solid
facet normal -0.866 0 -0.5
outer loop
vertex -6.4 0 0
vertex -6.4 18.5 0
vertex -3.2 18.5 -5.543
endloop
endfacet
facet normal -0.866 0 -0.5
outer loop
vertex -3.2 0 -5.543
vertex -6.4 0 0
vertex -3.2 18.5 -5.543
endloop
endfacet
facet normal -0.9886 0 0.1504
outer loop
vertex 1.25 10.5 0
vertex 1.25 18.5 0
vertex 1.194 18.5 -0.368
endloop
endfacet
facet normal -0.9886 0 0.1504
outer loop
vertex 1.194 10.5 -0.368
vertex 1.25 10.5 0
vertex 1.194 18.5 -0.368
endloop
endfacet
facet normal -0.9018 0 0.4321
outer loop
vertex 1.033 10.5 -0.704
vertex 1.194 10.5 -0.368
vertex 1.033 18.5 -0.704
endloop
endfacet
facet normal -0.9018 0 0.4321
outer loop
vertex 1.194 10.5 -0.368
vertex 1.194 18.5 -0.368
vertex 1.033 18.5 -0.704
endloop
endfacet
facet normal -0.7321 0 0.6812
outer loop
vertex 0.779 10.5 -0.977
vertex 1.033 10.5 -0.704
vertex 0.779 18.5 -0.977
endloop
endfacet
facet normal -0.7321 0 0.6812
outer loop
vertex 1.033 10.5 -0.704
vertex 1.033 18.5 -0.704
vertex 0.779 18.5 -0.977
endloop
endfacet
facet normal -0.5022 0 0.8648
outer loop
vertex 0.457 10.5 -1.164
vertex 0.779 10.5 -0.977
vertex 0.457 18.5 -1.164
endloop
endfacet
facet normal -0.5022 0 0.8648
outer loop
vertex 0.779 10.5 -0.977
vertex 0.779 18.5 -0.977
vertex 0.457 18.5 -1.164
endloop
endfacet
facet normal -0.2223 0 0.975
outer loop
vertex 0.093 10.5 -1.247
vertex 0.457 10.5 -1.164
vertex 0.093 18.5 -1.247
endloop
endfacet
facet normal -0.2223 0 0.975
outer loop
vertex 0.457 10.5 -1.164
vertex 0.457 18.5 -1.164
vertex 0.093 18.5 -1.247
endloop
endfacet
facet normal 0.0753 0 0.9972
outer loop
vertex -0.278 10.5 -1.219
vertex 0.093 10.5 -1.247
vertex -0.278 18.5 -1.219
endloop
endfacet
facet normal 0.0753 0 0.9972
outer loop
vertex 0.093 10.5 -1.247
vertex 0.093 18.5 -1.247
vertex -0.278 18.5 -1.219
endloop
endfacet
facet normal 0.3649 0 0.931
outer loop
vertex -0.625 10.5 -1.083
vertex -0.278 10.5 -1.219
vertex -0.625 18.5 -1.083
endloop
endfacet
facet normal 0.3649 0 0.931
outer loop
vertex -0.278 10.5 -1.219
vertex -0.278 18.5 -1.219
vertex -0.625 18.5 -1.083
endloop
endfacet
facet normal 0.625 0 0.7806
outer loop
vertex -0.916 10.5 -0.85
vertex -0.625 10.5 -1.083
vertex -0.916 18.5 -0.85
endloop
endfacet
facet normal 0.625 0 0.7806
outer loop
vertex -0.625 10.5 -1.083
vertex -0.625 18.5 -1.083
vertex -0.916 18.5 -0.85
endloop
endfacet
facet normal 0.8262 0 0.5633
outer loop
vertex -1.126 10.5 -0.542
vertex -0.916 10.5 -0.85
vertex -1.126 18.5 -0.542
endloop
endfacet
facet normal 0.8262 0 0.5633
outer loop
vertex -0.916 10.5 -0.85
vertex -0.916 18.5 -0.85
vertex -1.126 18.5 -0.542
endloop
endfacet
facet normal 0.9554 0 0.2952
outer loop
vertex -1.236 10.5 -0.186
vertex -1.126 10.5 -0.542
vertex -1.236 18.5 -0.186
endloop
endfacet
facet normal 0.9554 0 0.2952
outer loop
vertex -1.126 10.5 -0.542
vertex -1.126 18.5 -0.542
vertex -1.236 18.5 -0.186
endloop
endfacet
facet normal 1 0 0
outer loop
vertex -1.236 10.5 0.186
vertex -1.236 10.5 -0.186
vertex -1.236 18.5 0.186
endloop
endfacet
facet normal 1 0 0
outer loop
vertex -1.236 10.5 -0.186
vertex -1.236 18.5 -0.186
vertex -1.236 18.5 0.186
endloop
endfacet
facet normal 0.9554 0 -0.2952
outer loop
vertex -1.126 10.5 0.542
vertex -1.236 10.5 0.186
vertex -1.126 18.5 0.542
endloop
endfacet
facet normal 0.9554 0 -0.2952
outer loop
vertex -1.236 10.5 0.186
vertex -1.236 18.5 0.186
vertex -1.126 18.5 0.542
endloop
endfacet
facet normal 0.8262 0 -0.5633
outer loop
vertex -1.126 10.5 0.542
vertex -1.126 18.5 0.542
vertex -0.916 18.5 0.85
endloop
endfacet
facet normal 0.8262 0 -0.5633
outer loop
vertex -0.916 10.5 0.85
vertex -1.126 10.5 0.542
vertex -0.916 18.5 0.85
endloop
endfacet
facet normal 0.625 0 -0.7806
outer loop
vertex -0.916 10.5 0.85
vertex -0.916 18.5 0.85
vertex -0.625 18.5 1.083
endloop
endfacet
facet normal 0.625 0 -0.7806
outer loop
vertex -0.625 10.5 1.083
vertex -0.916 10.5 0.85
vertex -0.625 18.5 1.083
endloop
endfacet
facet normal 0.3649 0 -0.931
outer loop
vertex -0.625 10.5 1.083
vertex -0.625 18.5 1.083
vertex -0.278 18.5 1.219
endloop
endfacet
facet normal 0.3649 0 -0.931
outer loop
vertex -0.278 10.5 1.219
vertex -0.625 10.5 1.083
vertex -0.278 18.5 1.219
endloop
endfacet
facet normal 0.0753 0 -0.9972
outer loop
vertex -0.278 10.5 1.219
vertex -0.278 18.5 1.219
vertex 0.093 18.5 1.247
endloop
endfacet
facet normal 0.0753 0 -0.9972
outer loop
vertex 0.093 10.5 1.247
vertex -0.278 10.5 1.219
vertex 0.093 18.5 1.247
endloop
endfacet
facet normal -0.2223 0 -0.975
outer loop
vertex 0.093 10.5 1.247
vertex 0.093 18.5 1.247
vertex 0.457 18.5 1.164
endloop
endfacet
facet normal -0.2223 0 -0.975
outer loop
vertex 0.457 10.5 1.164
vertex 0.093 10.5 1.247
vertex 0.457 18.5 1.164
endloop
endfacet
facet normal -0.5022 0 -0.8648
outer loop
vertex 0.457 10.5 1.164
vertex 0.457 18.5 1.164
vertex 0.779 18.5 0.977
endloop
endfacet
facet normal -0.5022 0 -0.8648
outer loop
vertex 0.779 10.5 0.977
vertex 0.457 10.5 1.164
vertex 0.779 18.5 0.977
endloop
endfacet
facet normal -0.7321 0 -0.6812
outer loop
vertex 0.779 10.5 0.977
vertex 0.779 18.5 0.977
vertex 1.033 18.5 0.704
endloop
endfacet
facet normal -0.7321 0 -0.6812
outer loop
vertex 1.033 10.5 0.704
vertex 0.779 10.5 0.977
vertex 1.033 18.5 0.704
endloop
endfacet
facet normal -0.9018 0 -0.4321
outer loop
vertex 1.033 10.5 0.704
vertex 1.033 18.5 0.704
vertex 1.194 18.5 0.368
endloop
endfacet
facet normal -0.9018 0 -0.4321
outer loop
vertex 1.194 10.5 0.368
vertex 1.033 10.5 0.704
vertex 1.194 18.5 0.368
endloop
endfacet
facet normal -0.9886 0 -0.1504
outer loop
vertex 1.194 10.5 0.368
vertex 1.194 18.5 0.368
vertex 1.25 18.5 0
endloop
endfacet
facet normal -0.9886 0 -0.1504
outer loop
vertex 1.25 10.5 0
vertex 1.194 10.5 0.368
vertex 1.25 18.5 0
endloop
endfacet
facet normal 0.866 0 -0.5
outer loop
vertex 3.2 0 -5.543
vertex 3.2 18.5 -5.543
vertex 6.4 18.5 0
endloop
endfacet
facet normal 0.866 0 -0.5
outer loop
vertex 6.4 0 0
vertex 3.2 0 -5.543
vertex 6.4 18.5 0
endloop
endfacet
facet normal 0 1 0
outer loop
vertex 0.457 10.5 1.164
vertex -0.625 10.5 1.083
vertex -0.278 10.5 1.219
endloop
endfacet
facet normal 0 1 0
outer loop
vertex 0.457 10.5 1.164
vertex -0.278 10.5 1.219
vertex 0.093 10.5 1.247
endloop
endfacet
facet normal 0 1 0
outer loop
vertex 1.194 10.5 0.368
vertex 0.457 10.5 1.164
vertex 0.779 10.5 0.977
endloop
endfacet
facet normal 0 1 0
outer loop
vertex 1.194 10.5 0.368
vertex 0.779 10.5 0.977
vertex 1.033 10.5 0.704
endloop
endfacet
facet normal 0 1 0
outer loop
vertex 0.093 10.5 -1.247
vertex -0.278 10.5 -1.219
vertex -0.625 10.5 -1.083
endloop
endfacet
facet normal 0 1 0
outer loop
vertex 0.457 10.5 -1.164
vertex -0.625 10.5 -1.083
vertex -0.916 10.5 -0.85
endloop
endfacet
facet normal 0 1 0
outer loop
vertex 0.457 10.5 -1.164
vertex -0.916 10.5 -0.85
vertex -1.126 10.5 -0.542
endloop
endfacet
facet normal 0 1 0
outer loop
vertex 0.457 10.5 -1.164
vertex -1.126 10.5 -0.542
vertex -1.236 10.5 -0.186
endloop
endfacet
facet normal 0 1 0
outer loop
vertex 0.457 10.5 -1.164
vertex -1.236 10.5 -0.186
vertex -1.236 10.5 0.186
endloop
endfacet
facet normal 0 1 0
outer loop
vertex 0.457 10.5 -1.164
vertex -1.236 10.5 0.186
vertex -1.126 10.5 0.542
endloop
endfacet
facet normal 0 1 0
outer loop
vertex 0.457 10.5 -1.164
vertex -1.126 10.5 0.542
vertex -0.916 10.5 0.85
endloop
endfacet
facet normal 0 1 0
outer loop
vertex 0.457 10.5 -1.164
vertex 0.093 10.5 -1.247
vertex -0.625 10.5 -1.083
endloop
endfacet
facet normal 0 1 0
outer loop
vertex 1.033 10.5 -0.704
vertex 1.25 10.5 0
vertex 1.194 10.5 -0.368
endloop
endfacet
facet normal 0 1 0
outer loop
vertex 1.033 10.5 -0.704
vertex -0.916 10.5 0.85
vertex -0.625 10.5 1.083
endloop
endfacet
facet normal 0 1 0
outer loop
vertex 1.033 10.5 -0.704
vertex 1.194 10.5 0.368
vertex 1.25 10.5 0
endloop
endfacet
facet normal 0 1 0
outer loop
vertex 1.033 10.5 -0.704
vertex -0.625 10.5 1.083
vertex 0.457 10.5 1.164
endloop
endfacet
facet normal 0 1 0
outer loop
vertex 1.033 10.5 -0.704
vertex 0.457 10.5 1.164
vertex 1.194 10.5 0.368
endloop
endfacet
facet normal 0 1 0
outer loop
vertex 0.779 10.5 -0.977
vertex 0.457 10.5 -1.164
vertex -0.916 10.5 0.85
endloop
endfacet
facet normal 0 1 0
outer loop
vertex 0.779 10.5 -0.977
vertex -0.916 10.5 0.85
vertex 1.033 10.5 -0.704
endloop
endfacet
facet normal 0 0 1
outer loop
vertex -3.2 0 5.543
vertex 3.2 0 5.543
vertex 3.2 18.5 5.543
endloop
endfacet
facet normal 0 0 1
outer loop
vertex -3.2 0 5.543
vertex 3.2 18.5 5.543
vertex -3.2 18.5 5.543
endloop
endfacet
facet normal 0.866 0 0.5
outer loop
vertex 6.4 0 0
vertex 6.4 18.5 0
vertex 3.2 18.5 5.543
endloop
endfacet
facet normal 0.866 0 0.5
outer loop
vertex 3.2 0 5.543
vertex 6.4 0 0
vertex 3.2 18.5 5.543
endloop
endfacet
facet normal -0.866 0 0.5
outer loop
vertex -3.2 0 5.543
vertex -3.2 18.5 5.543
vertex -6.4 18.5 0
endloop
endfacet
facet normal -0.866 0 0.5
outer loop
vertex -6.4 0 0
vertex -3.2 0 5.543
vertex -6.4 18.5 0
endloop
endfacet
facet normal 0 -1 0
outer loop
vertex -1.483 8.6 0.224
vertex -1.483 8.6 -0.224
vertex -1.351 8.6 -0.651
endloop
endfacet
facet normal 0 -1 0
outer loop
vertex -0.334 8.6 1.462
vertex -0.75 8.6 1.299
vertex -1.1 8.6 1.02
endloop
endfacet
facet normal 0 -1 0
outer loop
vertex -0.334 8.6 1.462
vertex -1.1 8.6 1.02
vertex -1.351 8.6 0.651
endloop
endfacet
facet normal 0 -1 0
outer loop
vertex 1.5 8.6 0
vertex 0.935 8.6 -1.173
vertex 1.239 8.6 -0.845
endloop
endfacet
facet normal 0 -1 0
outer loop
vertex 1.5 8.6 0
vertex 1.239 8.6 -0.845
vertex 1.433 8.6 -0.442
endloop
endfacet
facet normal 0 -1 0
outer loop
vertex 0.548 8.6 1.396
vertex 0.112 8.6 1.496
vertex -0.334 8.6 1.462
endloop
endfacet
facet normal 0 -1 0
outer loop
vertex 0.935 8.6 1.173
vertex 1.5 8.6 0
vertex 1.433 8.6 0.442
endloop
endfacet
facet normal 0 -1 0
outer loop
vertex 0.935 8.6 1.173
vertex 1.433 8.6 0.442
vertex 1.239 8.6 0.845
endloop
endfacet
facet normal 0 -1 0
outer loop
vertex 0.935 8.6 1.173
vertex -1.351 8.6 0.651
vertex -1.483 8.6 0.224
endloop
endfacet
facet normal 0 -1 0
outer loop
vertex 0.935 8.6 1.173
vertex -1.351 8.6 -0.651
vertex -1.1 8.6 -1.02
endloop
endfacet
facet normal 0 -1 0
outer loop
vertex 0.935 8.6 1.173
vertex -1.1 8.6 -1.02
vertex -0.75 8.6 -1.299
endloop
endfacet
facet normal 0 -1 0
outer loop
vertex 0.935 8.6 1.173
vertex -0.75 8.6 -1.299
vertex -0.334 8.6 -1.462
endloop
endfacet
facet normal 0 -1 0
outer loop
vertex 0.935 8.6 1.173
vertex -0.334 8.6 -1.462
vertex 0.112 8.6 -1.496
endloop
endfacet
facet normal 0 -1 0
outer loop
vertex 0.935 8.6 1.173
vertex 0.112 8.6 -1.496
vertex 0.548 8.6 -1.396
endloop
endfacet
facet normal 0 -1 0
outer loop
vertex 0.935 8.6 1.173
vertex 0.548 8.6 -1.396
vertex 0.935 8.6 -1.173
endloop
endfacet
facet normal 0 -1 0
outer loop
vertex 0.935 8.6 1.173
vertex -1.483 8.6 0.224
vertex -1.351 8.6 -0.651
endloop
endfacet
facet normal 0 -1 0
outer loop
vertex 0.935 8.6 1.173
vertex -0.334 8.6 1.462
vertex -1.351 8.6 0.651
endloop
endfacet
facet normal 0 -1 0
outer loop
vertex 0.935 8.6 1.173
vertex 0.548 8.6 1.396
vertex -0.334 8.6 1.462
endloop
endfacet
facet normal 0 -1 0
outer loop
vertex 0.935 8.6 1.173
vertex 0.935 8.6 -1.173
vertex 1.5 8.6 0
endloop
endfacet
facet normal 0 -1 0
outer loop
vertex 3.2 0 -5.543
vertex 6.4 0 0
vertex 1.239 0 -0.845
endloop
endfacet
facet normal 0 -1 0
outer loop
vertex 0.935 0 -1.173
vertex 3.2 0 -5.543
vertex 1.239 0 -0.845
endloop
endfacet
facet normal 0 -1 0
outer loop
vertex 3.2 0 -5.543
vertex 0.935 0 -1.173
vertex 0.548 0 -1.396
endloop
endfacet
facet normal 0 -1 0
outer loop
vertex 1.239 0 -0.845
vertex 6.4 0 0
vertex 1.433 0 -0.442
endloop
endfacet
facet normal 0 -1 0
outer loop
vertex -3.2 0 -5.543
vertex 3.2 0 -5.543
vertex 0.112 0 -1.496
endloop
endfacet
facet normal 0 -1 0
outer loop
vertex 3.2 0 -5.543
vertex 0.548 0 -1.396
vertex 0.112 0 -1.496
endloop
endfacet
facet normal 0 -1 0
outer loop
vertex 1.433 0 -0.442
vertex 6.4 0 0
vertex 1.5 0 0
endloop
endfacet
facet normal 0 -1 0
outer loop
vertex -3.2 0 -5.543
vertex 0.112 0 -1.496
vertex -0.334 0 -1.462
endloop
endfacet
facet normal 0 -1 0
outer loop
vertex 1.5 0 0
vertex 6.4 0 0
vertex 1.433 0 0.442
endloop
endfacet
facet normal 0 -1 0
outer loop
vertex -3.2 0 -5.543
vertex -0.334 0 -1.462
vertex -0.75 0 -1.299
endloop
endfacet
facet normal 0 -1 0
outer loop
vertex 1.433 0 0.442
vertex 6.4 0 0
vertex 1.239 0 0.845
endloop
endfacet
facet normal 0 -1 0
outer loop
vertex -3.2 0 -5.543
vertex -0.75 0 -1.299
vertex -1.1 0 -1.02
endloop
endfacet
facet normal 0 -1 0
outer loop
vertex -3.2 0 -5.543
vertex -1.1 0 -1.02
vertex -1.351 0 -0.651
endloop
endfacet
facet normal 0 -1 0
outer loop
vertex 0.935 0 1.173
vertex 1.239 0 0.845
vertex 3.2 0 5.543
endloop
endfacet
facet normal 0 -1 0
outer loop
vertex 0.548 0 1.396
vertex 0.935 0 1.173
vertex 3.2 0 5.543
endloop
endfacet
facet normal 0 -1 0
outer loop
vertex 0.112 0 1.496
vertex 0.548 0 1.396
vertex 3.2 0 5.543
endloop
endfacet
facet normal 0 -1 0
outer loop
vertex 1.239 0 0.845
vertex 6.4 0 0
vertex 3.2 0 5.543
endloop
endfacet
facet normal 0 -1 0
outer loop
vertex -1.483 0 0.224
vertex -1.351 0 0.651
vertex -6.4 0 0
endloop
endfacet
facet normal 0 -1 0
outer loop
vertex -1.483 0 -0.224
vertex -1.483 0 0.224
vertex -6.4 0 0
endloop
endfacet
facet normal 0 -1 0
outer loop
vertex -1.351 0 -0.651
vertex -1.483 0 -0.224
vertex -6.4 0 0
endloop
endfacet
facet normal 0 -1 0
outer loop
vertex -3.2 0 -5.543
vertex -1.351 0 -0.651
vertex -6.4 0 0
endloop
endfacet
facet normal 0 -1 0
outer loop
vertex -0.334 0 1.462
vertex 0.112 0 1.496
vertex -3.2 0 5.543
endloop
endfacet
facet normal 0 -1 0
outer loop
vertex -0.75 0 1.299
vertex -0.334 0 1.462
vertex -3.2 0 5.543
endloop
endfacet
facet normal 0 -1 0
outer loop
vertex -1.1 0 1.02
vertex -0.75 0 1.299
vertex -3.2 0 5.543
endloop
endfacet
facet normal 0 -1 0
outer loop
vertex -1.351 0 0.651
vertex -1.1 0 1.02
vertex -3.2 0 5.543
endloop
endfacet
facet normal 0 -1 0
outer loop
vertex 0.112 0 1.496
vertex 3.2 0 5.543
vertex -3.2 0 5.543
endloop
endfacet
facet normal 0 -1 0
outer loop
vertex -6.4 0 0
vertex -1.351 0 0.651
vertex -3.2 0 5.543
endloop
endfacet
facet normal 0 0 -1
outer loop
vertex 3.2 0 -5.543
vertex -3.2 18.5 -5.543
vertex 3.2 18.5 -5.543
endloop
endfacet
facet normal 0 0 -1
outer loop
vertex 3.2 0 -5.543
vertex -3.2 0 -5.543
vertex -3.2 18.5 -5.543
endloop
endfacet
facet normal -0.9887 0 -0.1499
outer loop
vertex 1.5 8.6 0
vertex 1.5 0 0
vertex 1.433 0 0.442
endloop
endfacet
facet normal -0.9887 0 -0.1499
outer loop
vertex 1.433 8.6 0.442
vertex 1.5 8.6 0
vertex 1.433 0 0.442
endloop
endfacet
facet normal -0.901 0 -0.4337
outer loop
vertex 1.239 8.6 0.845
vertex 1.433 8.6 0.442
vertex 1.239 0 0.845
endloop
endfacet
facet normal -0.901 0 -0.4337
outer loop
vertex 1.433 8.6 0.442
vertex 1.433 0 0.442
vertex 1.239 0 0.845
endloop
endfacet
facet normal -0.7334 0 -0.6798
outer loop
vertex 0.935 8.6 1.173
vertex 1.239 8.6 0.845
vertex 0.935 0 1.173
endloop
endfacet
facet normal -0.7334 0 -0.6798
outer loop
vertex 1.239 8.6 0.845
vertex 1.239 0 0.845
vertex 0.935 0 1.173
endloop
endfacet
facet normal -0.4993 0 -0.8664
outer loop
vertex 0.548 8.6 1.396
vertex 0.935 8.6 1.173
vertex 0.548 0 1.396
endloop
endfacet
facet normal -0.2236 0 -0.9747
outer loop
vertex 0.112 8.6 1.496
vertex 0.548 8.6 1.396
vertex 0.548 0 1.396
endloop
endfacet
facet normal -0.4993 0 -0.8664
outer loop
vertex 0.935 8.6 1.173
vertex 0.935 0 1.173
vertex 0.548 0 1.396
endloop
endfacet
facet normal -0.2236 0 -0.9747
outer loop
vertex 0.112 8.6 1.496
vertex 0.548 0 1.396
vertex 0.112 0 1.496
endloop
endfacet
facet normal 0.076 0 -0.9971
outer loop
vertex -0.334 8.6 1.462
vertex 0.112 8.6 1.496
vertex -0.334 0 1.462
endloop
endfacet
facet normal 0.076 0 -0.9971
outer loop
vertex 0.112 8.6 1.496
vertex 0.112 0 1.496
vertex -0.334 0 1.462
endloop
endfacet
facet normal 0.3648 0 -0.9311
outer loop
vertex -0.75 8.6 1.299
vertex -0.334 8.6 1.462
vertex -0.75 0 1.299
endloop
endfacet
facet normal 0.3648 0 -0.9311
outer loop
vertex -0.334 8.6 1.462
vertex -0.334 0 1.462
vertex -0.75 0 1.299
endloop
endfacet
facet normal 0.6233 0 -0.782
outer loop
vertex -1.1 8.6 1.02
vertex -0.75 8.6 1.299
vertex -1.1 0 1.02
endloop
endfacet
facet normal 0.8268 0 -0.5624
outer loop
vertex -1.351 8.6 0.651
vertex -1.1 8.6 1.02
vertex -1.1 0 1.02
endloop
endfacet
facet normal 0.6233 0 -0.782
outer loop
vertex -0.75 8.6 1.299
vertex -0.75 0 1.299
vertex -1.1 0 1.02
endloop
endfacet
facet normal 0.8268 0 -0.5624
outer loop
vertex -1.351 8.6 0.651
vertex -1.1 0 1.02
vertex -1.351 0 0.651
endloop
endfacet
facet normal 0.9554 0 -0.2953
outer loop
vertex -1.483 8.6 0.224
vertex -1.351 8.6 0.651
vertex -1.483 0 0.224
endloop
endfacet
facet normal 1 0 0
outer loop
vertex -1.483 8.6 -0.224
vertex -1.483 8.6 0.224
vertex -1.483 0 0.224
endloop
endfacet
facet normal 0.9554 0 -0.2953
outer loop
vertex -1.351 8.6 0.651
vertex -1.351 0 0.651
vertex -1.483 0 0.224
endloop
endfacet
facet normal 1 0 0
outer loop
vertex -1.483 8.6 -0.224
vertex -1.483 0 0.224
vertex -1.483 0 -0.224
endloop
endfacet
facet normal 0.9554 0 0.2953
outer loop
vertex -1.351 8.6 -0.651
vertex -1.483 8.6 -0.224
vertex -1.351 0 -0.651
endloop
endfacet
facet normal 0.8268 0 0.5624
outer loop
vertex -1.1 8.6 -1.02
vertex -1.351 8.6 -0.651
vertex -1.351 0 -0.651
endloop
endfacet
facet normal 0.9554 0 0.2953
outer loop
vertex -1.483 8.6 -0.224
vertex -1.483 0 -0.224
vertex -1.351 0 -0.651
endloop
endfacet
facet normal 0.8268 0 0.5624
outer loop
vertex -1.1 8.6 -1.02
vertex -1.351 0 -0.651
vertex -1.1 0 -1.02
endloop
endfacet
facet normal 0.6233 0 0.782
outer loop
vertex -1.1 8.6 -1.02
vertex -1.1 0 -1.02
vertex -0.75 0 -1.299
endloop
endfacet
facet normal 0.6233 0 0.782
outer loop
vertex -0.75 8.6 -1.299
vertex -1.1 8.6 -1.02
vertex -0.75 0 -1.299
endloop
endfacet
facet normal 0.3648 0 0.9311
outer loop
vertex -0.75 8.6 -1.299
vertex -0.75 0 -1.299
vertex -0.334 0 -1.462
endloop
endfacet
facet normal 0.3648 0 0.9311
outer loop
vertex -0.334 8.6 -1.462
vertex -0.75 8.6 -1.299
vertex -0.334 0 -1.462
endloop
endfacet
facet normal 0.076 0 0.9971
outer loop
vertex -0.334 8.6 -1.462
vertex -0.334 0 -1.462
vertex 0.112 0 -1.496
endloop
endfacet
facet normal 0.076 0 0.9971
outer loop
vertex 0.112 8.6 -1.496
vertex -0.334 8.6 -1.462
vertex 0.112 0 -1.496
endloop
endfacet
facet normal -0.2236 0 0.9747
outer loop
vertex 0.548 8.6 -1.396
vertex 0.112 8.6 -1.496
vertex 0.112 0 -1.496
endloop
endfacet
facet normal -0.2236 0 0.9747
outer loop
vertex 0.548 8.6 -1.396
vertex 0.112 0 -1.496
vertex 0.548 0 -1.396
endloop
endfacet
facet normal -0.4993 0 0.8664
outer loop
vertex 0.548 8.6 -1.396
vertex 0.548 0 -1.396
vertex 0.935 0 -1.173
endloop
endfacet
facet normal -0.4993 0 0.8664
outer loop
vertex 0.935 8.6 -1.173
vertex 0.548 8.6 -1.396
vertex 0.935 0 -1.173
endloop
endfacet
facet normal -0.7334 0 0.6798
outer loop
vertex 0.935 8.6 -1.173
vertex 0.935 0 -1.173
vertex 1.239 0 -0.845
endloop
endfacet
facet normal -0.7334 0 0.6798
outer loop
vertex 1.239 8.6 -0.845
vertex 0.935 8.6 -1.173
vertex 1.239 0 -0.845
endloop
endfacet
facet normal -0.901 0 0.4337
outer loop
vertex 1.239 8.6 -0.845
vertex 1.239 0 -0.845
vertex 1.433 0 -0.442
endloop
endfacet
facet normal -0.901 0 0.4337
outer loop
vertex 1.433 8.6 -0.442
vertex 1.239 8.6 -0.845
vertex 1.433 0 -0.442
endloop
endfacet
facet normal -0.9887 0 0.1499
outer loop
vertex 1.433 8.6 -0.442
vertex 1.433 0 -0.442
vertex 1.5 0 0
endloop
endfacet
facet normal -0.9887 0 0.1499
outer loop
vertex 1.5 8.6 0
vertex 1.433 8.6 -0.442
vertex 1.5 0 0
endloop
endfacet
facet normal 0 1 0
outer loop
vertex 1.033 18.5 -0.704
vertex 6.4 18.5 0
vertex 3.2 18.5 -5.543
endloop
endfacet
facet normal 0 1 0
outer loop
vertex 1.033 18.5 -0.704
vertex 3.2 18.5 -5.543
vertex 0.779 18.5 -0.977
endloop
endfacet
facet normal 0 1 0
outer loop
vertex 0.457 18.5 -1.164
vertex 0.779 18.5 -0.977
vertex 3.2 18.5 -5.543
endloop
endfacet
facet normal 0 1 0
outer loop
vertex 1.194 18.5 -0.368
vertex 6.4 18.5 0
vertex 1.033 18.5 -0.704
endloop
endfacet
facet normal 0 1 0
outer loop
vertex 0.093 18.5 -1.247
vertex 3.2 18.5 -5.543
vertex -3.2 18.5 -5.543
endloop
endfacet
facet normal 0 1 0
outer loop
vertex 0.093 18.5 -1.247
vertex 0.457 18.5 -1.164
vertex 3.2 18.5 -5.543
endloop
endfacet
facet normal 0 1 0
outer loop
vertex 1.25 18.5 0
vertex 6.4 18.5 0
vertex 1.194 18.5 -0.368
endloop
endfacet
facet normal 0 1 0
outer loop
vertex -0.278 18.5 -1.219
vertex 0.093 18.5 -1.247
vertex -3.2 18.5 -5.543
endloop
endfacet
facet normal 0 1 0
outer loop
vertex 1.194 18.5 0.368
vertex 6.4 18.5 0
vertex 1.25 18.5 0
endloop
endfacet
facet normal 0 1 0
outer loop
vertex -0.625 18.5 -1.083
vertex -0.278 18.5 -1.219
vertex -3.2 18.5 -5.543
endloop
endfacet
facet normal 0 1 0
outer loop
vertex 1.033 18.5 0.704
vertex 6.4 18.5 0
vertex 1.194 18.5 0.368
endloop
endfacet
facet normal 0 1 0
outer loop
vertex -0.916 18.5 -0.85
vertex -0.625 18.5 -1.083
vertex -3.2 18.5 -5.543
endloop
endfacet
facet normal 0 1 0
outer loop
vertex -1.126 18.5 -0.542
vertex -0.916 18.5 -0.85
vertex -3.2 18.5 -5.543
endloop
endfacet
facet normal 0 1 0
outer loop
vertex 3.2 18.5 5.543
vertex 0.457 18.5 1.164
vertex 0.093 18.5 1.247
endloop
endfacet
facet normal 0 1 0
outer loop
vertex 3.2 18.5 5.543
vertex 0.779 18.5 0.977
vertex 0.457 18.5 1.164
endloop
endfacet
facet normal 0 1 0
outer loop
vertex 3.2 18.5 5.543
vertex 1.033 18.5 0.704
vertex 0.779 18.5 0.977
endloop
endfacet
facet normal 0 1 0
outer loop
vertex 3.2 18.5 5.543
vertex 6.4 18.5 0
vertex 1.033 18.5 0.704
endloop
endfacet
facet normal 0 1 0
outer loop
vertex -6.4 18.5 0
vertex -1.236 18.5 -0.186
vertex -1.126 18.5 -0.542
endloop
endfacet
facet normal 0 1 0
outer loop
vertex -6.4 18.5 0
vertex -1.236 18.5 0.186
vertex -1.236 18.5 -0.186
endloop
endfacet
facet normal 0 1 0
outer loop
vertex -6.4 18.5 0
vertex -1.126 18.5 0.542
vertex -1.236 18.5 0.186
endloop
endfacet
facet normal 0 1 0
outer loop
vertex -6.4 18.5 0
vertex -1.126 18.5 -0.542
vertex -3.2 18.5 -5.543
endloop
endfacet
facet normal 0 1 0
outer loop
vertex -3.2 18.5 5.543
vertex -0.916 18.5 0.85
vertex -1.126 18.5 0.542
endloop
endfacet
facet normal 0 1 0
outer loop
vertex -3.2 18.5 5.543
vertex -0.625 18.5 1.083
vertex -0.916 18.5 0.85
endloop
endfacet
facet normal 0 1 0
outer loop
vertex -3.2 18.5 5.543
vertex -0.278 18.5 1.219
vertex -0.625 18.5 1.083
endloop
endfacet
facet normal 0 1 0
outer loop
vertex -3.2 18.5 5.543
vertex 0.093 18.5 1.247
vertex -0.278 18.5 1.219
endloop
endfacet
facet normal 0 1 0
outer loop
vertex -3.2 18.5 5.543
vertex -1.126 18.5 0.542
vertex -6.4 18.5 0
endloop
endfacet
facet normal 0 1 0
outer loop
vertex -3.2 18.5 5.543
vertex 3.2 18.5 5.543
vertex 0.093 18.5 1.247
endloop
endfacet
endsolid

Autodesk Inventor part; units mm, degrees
ref_plane "YZ Plane" through (0, 0, 0) normal (1, 0, 0) x (0, 1, 0)
ref_plane "XZ Plane" through (0, 0, 0) normal (0, 1, 0) x (-1, 0, 0)
ref_plane "XY Plane" through (0, 0, 0) normal (0, 0, 1) x (1, 0, 0)
sketch "Sketch1" plane through (0, 0, 0) normal (0, 1, 0) x (-1, 0, 0)
  line L0 (6.4, 0) -> (3.2, -5.5426)
  line L1 (3.2, -5.5426) -> (-3.2, -5.5426)
  line L2 (-3.2, -5.5426) -> (-6.4, 0)
  line L3 (-6.4, 0) -> (-3.2, 5.5426)
  line L4 (-3.2, 5.5426) -> (3.2, 5.5426)
  line L5 (3.2, 5.5426) -> (6.4, 0)
  point P0 (0, 0)
  dimension "d1" = 6.4
extrude "Extrusion1" add sketch "Sketch1" along normal blind 18.5
sketch "Sketch2" plane through (0, 18.5, 0) normal (0, 1, 0) x (1, 0, 0)
  circle A0 centre (0, 0) radius 1.25
  dimension "d4" = 2.5
extrude "Extrusion2" cut sketch "Sketch2" against normal blind 8
sketch "Sketch3" plane through (0, 0, 0) normal (0, -1, 0) x (1, 0, 0)
  circle A0 centre (0, 0) radius 1.5
  dimension "d7" = 3
extrude "Extrusion3" cut sketch "Sketch3" against normal blind 8.6
